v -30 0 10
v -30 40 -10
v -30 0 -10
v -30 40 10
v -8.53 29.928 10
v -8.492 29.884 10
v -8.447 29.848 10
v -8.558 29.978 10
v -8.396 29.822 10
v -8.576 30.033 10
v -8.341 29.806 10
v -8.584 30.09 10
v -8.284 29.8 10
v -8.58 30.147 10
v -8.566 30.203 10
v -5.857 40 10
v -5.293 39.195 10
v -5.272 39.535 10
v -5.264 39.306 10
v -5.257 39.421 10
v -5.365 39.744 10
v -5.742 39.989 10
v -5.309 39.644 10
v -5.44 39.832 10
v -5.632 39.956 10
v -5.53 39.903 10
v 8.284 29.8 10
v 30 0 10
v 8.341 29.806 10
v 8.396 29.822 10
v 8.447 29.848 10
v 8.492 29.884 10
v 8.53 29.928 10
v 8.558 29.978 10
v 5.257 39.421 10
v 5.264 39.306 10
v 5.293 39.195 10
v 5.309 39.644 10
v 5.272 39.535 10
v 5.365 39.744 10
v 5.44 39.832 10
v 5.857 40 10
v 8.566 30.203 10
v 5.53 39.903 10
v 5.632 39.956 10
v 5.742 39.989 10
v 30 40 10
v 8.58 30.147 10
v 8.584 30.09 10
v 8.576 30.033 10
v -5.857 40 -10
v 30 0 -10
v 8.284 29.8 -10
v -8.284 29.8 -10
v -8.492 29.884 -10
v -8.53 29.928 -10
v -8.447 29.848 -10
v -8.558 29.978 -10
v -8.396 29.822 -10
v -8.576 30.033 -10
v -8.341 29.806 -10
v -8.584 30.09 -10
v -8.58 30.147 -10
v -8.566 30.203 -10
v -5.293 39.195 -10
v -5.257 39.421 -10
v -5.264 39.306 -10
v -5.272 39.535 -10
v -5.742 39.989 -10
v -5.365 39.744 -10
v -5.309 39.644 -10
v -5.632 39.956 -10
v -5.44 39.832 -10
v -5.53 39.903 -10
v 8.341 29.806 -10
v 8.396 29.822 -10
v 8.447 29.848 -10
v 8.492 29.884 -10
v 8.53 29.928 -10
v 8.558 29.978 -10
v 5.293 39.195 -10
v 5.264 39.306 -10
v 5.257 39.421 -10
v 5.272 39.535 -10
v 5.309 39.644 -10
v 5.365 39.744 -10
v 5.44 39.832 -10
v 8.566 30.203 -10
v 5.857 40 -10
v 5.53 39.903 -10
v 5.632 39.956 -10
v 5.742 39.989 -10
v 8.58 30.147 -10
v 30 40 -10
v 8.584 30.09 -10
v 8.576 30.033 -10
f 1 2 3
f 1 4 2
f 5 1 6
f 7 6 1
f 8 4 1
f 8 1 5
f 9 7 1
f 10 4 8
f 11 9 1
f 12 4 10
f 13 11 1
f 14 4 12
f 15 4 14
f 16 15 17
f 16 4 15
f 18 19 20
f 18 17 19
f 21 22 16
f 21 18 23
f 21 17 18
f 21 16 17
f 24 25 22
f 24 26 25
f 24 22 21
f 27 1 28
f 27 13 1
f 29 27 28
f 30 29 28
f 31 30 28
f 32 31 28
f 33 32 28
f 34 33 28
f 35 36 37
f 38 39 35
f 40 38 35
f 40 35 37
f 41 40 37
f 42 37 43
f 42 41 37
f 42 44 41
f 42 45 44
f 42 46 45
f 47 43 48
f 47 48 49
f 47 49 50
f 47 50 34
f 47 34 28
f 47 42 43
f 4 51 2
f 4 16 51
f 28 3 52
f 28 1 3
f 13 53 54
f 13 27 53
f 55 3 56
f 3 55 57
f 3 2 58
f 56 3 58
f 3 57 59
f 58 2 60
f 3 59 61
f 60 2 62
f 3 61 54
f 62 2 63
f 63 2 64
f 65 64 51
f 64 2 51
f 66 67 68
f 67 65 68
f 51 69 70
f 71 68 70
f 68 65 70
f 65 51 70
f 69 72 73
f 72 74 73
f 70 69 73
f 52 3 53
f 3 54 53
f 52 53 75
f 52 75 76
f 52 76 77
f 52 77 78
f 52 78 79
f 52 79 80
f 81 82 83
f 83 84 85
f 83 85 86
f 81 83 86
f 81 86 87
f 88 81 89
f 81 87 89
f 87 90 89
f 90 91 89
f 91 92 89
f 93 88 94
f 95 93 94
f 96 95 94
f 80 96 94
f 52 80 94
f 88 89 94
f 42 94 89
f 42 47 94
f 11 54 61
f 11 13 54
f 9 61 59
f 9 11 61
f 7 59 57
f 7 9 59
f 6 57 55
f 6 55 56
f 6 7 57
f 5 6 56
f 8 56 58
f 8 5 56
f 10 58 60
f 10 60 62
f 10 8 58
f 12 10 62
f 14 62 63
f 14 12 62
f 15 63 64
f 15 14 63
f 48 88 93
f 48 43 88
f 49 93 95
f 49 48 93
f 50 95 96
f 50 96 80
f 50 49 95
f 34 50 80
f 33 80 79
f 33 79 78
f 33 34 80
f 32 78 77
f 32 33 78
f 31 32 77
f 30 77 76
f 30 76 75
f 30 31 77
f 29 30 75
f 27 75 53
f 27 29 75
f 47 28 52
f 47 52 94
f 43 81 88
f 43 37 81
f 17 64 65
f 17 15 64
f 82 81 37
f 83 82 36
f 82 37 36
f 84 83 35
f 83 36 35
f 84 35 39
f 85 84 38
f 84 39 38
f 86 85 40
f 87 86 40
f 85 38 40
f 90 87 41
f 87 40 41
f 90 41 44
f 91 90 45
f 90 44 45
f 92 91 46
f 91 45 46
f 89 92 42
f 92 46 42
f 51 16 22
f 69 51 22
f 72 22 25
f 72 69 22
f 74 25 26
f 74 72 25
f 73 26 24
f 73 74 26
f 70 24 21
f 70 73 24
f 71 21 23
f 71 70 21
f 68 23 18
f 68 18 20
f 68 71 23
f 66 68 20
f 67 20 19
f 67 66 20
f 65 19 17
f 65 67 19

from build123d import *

# Parameters (mm, degrees)
F1_DEPTH = 10
F2_R     = 0.6
F3_R     = 0.3


with BuildPart() as f1:
    # F0 (on Top) → F1 (new body, symmetric)
    with BuildSketch(Plane.XY):
        Polygon((-30, 0), (0, 0), (30, 0), (30, 40), (5, 40), (8.712496, 29.8), (0, 29.8), (-8.712496, 29.8), (-5, 40), (-30, 40), align=None)
    extrude(amount=F1_DEPTH, both=True)

    # F2
    f2_edges = [f1.edges().sort_by_distance(p)[0] for p in [
        (-5, 40, 0),
        (5, 40, 0),
    ]]
    fillet(f2_edges, radius=F2_R)

    # F3
    f3_edges = [f1.edges().sort_by_distance(p)[0] for p in [
        (-8.712496, 29.8, 0),
        (8.712496, 29.8, 0),
    ]]
    fillet(f3_edges, radius=F3_R)


solid = f1.part
